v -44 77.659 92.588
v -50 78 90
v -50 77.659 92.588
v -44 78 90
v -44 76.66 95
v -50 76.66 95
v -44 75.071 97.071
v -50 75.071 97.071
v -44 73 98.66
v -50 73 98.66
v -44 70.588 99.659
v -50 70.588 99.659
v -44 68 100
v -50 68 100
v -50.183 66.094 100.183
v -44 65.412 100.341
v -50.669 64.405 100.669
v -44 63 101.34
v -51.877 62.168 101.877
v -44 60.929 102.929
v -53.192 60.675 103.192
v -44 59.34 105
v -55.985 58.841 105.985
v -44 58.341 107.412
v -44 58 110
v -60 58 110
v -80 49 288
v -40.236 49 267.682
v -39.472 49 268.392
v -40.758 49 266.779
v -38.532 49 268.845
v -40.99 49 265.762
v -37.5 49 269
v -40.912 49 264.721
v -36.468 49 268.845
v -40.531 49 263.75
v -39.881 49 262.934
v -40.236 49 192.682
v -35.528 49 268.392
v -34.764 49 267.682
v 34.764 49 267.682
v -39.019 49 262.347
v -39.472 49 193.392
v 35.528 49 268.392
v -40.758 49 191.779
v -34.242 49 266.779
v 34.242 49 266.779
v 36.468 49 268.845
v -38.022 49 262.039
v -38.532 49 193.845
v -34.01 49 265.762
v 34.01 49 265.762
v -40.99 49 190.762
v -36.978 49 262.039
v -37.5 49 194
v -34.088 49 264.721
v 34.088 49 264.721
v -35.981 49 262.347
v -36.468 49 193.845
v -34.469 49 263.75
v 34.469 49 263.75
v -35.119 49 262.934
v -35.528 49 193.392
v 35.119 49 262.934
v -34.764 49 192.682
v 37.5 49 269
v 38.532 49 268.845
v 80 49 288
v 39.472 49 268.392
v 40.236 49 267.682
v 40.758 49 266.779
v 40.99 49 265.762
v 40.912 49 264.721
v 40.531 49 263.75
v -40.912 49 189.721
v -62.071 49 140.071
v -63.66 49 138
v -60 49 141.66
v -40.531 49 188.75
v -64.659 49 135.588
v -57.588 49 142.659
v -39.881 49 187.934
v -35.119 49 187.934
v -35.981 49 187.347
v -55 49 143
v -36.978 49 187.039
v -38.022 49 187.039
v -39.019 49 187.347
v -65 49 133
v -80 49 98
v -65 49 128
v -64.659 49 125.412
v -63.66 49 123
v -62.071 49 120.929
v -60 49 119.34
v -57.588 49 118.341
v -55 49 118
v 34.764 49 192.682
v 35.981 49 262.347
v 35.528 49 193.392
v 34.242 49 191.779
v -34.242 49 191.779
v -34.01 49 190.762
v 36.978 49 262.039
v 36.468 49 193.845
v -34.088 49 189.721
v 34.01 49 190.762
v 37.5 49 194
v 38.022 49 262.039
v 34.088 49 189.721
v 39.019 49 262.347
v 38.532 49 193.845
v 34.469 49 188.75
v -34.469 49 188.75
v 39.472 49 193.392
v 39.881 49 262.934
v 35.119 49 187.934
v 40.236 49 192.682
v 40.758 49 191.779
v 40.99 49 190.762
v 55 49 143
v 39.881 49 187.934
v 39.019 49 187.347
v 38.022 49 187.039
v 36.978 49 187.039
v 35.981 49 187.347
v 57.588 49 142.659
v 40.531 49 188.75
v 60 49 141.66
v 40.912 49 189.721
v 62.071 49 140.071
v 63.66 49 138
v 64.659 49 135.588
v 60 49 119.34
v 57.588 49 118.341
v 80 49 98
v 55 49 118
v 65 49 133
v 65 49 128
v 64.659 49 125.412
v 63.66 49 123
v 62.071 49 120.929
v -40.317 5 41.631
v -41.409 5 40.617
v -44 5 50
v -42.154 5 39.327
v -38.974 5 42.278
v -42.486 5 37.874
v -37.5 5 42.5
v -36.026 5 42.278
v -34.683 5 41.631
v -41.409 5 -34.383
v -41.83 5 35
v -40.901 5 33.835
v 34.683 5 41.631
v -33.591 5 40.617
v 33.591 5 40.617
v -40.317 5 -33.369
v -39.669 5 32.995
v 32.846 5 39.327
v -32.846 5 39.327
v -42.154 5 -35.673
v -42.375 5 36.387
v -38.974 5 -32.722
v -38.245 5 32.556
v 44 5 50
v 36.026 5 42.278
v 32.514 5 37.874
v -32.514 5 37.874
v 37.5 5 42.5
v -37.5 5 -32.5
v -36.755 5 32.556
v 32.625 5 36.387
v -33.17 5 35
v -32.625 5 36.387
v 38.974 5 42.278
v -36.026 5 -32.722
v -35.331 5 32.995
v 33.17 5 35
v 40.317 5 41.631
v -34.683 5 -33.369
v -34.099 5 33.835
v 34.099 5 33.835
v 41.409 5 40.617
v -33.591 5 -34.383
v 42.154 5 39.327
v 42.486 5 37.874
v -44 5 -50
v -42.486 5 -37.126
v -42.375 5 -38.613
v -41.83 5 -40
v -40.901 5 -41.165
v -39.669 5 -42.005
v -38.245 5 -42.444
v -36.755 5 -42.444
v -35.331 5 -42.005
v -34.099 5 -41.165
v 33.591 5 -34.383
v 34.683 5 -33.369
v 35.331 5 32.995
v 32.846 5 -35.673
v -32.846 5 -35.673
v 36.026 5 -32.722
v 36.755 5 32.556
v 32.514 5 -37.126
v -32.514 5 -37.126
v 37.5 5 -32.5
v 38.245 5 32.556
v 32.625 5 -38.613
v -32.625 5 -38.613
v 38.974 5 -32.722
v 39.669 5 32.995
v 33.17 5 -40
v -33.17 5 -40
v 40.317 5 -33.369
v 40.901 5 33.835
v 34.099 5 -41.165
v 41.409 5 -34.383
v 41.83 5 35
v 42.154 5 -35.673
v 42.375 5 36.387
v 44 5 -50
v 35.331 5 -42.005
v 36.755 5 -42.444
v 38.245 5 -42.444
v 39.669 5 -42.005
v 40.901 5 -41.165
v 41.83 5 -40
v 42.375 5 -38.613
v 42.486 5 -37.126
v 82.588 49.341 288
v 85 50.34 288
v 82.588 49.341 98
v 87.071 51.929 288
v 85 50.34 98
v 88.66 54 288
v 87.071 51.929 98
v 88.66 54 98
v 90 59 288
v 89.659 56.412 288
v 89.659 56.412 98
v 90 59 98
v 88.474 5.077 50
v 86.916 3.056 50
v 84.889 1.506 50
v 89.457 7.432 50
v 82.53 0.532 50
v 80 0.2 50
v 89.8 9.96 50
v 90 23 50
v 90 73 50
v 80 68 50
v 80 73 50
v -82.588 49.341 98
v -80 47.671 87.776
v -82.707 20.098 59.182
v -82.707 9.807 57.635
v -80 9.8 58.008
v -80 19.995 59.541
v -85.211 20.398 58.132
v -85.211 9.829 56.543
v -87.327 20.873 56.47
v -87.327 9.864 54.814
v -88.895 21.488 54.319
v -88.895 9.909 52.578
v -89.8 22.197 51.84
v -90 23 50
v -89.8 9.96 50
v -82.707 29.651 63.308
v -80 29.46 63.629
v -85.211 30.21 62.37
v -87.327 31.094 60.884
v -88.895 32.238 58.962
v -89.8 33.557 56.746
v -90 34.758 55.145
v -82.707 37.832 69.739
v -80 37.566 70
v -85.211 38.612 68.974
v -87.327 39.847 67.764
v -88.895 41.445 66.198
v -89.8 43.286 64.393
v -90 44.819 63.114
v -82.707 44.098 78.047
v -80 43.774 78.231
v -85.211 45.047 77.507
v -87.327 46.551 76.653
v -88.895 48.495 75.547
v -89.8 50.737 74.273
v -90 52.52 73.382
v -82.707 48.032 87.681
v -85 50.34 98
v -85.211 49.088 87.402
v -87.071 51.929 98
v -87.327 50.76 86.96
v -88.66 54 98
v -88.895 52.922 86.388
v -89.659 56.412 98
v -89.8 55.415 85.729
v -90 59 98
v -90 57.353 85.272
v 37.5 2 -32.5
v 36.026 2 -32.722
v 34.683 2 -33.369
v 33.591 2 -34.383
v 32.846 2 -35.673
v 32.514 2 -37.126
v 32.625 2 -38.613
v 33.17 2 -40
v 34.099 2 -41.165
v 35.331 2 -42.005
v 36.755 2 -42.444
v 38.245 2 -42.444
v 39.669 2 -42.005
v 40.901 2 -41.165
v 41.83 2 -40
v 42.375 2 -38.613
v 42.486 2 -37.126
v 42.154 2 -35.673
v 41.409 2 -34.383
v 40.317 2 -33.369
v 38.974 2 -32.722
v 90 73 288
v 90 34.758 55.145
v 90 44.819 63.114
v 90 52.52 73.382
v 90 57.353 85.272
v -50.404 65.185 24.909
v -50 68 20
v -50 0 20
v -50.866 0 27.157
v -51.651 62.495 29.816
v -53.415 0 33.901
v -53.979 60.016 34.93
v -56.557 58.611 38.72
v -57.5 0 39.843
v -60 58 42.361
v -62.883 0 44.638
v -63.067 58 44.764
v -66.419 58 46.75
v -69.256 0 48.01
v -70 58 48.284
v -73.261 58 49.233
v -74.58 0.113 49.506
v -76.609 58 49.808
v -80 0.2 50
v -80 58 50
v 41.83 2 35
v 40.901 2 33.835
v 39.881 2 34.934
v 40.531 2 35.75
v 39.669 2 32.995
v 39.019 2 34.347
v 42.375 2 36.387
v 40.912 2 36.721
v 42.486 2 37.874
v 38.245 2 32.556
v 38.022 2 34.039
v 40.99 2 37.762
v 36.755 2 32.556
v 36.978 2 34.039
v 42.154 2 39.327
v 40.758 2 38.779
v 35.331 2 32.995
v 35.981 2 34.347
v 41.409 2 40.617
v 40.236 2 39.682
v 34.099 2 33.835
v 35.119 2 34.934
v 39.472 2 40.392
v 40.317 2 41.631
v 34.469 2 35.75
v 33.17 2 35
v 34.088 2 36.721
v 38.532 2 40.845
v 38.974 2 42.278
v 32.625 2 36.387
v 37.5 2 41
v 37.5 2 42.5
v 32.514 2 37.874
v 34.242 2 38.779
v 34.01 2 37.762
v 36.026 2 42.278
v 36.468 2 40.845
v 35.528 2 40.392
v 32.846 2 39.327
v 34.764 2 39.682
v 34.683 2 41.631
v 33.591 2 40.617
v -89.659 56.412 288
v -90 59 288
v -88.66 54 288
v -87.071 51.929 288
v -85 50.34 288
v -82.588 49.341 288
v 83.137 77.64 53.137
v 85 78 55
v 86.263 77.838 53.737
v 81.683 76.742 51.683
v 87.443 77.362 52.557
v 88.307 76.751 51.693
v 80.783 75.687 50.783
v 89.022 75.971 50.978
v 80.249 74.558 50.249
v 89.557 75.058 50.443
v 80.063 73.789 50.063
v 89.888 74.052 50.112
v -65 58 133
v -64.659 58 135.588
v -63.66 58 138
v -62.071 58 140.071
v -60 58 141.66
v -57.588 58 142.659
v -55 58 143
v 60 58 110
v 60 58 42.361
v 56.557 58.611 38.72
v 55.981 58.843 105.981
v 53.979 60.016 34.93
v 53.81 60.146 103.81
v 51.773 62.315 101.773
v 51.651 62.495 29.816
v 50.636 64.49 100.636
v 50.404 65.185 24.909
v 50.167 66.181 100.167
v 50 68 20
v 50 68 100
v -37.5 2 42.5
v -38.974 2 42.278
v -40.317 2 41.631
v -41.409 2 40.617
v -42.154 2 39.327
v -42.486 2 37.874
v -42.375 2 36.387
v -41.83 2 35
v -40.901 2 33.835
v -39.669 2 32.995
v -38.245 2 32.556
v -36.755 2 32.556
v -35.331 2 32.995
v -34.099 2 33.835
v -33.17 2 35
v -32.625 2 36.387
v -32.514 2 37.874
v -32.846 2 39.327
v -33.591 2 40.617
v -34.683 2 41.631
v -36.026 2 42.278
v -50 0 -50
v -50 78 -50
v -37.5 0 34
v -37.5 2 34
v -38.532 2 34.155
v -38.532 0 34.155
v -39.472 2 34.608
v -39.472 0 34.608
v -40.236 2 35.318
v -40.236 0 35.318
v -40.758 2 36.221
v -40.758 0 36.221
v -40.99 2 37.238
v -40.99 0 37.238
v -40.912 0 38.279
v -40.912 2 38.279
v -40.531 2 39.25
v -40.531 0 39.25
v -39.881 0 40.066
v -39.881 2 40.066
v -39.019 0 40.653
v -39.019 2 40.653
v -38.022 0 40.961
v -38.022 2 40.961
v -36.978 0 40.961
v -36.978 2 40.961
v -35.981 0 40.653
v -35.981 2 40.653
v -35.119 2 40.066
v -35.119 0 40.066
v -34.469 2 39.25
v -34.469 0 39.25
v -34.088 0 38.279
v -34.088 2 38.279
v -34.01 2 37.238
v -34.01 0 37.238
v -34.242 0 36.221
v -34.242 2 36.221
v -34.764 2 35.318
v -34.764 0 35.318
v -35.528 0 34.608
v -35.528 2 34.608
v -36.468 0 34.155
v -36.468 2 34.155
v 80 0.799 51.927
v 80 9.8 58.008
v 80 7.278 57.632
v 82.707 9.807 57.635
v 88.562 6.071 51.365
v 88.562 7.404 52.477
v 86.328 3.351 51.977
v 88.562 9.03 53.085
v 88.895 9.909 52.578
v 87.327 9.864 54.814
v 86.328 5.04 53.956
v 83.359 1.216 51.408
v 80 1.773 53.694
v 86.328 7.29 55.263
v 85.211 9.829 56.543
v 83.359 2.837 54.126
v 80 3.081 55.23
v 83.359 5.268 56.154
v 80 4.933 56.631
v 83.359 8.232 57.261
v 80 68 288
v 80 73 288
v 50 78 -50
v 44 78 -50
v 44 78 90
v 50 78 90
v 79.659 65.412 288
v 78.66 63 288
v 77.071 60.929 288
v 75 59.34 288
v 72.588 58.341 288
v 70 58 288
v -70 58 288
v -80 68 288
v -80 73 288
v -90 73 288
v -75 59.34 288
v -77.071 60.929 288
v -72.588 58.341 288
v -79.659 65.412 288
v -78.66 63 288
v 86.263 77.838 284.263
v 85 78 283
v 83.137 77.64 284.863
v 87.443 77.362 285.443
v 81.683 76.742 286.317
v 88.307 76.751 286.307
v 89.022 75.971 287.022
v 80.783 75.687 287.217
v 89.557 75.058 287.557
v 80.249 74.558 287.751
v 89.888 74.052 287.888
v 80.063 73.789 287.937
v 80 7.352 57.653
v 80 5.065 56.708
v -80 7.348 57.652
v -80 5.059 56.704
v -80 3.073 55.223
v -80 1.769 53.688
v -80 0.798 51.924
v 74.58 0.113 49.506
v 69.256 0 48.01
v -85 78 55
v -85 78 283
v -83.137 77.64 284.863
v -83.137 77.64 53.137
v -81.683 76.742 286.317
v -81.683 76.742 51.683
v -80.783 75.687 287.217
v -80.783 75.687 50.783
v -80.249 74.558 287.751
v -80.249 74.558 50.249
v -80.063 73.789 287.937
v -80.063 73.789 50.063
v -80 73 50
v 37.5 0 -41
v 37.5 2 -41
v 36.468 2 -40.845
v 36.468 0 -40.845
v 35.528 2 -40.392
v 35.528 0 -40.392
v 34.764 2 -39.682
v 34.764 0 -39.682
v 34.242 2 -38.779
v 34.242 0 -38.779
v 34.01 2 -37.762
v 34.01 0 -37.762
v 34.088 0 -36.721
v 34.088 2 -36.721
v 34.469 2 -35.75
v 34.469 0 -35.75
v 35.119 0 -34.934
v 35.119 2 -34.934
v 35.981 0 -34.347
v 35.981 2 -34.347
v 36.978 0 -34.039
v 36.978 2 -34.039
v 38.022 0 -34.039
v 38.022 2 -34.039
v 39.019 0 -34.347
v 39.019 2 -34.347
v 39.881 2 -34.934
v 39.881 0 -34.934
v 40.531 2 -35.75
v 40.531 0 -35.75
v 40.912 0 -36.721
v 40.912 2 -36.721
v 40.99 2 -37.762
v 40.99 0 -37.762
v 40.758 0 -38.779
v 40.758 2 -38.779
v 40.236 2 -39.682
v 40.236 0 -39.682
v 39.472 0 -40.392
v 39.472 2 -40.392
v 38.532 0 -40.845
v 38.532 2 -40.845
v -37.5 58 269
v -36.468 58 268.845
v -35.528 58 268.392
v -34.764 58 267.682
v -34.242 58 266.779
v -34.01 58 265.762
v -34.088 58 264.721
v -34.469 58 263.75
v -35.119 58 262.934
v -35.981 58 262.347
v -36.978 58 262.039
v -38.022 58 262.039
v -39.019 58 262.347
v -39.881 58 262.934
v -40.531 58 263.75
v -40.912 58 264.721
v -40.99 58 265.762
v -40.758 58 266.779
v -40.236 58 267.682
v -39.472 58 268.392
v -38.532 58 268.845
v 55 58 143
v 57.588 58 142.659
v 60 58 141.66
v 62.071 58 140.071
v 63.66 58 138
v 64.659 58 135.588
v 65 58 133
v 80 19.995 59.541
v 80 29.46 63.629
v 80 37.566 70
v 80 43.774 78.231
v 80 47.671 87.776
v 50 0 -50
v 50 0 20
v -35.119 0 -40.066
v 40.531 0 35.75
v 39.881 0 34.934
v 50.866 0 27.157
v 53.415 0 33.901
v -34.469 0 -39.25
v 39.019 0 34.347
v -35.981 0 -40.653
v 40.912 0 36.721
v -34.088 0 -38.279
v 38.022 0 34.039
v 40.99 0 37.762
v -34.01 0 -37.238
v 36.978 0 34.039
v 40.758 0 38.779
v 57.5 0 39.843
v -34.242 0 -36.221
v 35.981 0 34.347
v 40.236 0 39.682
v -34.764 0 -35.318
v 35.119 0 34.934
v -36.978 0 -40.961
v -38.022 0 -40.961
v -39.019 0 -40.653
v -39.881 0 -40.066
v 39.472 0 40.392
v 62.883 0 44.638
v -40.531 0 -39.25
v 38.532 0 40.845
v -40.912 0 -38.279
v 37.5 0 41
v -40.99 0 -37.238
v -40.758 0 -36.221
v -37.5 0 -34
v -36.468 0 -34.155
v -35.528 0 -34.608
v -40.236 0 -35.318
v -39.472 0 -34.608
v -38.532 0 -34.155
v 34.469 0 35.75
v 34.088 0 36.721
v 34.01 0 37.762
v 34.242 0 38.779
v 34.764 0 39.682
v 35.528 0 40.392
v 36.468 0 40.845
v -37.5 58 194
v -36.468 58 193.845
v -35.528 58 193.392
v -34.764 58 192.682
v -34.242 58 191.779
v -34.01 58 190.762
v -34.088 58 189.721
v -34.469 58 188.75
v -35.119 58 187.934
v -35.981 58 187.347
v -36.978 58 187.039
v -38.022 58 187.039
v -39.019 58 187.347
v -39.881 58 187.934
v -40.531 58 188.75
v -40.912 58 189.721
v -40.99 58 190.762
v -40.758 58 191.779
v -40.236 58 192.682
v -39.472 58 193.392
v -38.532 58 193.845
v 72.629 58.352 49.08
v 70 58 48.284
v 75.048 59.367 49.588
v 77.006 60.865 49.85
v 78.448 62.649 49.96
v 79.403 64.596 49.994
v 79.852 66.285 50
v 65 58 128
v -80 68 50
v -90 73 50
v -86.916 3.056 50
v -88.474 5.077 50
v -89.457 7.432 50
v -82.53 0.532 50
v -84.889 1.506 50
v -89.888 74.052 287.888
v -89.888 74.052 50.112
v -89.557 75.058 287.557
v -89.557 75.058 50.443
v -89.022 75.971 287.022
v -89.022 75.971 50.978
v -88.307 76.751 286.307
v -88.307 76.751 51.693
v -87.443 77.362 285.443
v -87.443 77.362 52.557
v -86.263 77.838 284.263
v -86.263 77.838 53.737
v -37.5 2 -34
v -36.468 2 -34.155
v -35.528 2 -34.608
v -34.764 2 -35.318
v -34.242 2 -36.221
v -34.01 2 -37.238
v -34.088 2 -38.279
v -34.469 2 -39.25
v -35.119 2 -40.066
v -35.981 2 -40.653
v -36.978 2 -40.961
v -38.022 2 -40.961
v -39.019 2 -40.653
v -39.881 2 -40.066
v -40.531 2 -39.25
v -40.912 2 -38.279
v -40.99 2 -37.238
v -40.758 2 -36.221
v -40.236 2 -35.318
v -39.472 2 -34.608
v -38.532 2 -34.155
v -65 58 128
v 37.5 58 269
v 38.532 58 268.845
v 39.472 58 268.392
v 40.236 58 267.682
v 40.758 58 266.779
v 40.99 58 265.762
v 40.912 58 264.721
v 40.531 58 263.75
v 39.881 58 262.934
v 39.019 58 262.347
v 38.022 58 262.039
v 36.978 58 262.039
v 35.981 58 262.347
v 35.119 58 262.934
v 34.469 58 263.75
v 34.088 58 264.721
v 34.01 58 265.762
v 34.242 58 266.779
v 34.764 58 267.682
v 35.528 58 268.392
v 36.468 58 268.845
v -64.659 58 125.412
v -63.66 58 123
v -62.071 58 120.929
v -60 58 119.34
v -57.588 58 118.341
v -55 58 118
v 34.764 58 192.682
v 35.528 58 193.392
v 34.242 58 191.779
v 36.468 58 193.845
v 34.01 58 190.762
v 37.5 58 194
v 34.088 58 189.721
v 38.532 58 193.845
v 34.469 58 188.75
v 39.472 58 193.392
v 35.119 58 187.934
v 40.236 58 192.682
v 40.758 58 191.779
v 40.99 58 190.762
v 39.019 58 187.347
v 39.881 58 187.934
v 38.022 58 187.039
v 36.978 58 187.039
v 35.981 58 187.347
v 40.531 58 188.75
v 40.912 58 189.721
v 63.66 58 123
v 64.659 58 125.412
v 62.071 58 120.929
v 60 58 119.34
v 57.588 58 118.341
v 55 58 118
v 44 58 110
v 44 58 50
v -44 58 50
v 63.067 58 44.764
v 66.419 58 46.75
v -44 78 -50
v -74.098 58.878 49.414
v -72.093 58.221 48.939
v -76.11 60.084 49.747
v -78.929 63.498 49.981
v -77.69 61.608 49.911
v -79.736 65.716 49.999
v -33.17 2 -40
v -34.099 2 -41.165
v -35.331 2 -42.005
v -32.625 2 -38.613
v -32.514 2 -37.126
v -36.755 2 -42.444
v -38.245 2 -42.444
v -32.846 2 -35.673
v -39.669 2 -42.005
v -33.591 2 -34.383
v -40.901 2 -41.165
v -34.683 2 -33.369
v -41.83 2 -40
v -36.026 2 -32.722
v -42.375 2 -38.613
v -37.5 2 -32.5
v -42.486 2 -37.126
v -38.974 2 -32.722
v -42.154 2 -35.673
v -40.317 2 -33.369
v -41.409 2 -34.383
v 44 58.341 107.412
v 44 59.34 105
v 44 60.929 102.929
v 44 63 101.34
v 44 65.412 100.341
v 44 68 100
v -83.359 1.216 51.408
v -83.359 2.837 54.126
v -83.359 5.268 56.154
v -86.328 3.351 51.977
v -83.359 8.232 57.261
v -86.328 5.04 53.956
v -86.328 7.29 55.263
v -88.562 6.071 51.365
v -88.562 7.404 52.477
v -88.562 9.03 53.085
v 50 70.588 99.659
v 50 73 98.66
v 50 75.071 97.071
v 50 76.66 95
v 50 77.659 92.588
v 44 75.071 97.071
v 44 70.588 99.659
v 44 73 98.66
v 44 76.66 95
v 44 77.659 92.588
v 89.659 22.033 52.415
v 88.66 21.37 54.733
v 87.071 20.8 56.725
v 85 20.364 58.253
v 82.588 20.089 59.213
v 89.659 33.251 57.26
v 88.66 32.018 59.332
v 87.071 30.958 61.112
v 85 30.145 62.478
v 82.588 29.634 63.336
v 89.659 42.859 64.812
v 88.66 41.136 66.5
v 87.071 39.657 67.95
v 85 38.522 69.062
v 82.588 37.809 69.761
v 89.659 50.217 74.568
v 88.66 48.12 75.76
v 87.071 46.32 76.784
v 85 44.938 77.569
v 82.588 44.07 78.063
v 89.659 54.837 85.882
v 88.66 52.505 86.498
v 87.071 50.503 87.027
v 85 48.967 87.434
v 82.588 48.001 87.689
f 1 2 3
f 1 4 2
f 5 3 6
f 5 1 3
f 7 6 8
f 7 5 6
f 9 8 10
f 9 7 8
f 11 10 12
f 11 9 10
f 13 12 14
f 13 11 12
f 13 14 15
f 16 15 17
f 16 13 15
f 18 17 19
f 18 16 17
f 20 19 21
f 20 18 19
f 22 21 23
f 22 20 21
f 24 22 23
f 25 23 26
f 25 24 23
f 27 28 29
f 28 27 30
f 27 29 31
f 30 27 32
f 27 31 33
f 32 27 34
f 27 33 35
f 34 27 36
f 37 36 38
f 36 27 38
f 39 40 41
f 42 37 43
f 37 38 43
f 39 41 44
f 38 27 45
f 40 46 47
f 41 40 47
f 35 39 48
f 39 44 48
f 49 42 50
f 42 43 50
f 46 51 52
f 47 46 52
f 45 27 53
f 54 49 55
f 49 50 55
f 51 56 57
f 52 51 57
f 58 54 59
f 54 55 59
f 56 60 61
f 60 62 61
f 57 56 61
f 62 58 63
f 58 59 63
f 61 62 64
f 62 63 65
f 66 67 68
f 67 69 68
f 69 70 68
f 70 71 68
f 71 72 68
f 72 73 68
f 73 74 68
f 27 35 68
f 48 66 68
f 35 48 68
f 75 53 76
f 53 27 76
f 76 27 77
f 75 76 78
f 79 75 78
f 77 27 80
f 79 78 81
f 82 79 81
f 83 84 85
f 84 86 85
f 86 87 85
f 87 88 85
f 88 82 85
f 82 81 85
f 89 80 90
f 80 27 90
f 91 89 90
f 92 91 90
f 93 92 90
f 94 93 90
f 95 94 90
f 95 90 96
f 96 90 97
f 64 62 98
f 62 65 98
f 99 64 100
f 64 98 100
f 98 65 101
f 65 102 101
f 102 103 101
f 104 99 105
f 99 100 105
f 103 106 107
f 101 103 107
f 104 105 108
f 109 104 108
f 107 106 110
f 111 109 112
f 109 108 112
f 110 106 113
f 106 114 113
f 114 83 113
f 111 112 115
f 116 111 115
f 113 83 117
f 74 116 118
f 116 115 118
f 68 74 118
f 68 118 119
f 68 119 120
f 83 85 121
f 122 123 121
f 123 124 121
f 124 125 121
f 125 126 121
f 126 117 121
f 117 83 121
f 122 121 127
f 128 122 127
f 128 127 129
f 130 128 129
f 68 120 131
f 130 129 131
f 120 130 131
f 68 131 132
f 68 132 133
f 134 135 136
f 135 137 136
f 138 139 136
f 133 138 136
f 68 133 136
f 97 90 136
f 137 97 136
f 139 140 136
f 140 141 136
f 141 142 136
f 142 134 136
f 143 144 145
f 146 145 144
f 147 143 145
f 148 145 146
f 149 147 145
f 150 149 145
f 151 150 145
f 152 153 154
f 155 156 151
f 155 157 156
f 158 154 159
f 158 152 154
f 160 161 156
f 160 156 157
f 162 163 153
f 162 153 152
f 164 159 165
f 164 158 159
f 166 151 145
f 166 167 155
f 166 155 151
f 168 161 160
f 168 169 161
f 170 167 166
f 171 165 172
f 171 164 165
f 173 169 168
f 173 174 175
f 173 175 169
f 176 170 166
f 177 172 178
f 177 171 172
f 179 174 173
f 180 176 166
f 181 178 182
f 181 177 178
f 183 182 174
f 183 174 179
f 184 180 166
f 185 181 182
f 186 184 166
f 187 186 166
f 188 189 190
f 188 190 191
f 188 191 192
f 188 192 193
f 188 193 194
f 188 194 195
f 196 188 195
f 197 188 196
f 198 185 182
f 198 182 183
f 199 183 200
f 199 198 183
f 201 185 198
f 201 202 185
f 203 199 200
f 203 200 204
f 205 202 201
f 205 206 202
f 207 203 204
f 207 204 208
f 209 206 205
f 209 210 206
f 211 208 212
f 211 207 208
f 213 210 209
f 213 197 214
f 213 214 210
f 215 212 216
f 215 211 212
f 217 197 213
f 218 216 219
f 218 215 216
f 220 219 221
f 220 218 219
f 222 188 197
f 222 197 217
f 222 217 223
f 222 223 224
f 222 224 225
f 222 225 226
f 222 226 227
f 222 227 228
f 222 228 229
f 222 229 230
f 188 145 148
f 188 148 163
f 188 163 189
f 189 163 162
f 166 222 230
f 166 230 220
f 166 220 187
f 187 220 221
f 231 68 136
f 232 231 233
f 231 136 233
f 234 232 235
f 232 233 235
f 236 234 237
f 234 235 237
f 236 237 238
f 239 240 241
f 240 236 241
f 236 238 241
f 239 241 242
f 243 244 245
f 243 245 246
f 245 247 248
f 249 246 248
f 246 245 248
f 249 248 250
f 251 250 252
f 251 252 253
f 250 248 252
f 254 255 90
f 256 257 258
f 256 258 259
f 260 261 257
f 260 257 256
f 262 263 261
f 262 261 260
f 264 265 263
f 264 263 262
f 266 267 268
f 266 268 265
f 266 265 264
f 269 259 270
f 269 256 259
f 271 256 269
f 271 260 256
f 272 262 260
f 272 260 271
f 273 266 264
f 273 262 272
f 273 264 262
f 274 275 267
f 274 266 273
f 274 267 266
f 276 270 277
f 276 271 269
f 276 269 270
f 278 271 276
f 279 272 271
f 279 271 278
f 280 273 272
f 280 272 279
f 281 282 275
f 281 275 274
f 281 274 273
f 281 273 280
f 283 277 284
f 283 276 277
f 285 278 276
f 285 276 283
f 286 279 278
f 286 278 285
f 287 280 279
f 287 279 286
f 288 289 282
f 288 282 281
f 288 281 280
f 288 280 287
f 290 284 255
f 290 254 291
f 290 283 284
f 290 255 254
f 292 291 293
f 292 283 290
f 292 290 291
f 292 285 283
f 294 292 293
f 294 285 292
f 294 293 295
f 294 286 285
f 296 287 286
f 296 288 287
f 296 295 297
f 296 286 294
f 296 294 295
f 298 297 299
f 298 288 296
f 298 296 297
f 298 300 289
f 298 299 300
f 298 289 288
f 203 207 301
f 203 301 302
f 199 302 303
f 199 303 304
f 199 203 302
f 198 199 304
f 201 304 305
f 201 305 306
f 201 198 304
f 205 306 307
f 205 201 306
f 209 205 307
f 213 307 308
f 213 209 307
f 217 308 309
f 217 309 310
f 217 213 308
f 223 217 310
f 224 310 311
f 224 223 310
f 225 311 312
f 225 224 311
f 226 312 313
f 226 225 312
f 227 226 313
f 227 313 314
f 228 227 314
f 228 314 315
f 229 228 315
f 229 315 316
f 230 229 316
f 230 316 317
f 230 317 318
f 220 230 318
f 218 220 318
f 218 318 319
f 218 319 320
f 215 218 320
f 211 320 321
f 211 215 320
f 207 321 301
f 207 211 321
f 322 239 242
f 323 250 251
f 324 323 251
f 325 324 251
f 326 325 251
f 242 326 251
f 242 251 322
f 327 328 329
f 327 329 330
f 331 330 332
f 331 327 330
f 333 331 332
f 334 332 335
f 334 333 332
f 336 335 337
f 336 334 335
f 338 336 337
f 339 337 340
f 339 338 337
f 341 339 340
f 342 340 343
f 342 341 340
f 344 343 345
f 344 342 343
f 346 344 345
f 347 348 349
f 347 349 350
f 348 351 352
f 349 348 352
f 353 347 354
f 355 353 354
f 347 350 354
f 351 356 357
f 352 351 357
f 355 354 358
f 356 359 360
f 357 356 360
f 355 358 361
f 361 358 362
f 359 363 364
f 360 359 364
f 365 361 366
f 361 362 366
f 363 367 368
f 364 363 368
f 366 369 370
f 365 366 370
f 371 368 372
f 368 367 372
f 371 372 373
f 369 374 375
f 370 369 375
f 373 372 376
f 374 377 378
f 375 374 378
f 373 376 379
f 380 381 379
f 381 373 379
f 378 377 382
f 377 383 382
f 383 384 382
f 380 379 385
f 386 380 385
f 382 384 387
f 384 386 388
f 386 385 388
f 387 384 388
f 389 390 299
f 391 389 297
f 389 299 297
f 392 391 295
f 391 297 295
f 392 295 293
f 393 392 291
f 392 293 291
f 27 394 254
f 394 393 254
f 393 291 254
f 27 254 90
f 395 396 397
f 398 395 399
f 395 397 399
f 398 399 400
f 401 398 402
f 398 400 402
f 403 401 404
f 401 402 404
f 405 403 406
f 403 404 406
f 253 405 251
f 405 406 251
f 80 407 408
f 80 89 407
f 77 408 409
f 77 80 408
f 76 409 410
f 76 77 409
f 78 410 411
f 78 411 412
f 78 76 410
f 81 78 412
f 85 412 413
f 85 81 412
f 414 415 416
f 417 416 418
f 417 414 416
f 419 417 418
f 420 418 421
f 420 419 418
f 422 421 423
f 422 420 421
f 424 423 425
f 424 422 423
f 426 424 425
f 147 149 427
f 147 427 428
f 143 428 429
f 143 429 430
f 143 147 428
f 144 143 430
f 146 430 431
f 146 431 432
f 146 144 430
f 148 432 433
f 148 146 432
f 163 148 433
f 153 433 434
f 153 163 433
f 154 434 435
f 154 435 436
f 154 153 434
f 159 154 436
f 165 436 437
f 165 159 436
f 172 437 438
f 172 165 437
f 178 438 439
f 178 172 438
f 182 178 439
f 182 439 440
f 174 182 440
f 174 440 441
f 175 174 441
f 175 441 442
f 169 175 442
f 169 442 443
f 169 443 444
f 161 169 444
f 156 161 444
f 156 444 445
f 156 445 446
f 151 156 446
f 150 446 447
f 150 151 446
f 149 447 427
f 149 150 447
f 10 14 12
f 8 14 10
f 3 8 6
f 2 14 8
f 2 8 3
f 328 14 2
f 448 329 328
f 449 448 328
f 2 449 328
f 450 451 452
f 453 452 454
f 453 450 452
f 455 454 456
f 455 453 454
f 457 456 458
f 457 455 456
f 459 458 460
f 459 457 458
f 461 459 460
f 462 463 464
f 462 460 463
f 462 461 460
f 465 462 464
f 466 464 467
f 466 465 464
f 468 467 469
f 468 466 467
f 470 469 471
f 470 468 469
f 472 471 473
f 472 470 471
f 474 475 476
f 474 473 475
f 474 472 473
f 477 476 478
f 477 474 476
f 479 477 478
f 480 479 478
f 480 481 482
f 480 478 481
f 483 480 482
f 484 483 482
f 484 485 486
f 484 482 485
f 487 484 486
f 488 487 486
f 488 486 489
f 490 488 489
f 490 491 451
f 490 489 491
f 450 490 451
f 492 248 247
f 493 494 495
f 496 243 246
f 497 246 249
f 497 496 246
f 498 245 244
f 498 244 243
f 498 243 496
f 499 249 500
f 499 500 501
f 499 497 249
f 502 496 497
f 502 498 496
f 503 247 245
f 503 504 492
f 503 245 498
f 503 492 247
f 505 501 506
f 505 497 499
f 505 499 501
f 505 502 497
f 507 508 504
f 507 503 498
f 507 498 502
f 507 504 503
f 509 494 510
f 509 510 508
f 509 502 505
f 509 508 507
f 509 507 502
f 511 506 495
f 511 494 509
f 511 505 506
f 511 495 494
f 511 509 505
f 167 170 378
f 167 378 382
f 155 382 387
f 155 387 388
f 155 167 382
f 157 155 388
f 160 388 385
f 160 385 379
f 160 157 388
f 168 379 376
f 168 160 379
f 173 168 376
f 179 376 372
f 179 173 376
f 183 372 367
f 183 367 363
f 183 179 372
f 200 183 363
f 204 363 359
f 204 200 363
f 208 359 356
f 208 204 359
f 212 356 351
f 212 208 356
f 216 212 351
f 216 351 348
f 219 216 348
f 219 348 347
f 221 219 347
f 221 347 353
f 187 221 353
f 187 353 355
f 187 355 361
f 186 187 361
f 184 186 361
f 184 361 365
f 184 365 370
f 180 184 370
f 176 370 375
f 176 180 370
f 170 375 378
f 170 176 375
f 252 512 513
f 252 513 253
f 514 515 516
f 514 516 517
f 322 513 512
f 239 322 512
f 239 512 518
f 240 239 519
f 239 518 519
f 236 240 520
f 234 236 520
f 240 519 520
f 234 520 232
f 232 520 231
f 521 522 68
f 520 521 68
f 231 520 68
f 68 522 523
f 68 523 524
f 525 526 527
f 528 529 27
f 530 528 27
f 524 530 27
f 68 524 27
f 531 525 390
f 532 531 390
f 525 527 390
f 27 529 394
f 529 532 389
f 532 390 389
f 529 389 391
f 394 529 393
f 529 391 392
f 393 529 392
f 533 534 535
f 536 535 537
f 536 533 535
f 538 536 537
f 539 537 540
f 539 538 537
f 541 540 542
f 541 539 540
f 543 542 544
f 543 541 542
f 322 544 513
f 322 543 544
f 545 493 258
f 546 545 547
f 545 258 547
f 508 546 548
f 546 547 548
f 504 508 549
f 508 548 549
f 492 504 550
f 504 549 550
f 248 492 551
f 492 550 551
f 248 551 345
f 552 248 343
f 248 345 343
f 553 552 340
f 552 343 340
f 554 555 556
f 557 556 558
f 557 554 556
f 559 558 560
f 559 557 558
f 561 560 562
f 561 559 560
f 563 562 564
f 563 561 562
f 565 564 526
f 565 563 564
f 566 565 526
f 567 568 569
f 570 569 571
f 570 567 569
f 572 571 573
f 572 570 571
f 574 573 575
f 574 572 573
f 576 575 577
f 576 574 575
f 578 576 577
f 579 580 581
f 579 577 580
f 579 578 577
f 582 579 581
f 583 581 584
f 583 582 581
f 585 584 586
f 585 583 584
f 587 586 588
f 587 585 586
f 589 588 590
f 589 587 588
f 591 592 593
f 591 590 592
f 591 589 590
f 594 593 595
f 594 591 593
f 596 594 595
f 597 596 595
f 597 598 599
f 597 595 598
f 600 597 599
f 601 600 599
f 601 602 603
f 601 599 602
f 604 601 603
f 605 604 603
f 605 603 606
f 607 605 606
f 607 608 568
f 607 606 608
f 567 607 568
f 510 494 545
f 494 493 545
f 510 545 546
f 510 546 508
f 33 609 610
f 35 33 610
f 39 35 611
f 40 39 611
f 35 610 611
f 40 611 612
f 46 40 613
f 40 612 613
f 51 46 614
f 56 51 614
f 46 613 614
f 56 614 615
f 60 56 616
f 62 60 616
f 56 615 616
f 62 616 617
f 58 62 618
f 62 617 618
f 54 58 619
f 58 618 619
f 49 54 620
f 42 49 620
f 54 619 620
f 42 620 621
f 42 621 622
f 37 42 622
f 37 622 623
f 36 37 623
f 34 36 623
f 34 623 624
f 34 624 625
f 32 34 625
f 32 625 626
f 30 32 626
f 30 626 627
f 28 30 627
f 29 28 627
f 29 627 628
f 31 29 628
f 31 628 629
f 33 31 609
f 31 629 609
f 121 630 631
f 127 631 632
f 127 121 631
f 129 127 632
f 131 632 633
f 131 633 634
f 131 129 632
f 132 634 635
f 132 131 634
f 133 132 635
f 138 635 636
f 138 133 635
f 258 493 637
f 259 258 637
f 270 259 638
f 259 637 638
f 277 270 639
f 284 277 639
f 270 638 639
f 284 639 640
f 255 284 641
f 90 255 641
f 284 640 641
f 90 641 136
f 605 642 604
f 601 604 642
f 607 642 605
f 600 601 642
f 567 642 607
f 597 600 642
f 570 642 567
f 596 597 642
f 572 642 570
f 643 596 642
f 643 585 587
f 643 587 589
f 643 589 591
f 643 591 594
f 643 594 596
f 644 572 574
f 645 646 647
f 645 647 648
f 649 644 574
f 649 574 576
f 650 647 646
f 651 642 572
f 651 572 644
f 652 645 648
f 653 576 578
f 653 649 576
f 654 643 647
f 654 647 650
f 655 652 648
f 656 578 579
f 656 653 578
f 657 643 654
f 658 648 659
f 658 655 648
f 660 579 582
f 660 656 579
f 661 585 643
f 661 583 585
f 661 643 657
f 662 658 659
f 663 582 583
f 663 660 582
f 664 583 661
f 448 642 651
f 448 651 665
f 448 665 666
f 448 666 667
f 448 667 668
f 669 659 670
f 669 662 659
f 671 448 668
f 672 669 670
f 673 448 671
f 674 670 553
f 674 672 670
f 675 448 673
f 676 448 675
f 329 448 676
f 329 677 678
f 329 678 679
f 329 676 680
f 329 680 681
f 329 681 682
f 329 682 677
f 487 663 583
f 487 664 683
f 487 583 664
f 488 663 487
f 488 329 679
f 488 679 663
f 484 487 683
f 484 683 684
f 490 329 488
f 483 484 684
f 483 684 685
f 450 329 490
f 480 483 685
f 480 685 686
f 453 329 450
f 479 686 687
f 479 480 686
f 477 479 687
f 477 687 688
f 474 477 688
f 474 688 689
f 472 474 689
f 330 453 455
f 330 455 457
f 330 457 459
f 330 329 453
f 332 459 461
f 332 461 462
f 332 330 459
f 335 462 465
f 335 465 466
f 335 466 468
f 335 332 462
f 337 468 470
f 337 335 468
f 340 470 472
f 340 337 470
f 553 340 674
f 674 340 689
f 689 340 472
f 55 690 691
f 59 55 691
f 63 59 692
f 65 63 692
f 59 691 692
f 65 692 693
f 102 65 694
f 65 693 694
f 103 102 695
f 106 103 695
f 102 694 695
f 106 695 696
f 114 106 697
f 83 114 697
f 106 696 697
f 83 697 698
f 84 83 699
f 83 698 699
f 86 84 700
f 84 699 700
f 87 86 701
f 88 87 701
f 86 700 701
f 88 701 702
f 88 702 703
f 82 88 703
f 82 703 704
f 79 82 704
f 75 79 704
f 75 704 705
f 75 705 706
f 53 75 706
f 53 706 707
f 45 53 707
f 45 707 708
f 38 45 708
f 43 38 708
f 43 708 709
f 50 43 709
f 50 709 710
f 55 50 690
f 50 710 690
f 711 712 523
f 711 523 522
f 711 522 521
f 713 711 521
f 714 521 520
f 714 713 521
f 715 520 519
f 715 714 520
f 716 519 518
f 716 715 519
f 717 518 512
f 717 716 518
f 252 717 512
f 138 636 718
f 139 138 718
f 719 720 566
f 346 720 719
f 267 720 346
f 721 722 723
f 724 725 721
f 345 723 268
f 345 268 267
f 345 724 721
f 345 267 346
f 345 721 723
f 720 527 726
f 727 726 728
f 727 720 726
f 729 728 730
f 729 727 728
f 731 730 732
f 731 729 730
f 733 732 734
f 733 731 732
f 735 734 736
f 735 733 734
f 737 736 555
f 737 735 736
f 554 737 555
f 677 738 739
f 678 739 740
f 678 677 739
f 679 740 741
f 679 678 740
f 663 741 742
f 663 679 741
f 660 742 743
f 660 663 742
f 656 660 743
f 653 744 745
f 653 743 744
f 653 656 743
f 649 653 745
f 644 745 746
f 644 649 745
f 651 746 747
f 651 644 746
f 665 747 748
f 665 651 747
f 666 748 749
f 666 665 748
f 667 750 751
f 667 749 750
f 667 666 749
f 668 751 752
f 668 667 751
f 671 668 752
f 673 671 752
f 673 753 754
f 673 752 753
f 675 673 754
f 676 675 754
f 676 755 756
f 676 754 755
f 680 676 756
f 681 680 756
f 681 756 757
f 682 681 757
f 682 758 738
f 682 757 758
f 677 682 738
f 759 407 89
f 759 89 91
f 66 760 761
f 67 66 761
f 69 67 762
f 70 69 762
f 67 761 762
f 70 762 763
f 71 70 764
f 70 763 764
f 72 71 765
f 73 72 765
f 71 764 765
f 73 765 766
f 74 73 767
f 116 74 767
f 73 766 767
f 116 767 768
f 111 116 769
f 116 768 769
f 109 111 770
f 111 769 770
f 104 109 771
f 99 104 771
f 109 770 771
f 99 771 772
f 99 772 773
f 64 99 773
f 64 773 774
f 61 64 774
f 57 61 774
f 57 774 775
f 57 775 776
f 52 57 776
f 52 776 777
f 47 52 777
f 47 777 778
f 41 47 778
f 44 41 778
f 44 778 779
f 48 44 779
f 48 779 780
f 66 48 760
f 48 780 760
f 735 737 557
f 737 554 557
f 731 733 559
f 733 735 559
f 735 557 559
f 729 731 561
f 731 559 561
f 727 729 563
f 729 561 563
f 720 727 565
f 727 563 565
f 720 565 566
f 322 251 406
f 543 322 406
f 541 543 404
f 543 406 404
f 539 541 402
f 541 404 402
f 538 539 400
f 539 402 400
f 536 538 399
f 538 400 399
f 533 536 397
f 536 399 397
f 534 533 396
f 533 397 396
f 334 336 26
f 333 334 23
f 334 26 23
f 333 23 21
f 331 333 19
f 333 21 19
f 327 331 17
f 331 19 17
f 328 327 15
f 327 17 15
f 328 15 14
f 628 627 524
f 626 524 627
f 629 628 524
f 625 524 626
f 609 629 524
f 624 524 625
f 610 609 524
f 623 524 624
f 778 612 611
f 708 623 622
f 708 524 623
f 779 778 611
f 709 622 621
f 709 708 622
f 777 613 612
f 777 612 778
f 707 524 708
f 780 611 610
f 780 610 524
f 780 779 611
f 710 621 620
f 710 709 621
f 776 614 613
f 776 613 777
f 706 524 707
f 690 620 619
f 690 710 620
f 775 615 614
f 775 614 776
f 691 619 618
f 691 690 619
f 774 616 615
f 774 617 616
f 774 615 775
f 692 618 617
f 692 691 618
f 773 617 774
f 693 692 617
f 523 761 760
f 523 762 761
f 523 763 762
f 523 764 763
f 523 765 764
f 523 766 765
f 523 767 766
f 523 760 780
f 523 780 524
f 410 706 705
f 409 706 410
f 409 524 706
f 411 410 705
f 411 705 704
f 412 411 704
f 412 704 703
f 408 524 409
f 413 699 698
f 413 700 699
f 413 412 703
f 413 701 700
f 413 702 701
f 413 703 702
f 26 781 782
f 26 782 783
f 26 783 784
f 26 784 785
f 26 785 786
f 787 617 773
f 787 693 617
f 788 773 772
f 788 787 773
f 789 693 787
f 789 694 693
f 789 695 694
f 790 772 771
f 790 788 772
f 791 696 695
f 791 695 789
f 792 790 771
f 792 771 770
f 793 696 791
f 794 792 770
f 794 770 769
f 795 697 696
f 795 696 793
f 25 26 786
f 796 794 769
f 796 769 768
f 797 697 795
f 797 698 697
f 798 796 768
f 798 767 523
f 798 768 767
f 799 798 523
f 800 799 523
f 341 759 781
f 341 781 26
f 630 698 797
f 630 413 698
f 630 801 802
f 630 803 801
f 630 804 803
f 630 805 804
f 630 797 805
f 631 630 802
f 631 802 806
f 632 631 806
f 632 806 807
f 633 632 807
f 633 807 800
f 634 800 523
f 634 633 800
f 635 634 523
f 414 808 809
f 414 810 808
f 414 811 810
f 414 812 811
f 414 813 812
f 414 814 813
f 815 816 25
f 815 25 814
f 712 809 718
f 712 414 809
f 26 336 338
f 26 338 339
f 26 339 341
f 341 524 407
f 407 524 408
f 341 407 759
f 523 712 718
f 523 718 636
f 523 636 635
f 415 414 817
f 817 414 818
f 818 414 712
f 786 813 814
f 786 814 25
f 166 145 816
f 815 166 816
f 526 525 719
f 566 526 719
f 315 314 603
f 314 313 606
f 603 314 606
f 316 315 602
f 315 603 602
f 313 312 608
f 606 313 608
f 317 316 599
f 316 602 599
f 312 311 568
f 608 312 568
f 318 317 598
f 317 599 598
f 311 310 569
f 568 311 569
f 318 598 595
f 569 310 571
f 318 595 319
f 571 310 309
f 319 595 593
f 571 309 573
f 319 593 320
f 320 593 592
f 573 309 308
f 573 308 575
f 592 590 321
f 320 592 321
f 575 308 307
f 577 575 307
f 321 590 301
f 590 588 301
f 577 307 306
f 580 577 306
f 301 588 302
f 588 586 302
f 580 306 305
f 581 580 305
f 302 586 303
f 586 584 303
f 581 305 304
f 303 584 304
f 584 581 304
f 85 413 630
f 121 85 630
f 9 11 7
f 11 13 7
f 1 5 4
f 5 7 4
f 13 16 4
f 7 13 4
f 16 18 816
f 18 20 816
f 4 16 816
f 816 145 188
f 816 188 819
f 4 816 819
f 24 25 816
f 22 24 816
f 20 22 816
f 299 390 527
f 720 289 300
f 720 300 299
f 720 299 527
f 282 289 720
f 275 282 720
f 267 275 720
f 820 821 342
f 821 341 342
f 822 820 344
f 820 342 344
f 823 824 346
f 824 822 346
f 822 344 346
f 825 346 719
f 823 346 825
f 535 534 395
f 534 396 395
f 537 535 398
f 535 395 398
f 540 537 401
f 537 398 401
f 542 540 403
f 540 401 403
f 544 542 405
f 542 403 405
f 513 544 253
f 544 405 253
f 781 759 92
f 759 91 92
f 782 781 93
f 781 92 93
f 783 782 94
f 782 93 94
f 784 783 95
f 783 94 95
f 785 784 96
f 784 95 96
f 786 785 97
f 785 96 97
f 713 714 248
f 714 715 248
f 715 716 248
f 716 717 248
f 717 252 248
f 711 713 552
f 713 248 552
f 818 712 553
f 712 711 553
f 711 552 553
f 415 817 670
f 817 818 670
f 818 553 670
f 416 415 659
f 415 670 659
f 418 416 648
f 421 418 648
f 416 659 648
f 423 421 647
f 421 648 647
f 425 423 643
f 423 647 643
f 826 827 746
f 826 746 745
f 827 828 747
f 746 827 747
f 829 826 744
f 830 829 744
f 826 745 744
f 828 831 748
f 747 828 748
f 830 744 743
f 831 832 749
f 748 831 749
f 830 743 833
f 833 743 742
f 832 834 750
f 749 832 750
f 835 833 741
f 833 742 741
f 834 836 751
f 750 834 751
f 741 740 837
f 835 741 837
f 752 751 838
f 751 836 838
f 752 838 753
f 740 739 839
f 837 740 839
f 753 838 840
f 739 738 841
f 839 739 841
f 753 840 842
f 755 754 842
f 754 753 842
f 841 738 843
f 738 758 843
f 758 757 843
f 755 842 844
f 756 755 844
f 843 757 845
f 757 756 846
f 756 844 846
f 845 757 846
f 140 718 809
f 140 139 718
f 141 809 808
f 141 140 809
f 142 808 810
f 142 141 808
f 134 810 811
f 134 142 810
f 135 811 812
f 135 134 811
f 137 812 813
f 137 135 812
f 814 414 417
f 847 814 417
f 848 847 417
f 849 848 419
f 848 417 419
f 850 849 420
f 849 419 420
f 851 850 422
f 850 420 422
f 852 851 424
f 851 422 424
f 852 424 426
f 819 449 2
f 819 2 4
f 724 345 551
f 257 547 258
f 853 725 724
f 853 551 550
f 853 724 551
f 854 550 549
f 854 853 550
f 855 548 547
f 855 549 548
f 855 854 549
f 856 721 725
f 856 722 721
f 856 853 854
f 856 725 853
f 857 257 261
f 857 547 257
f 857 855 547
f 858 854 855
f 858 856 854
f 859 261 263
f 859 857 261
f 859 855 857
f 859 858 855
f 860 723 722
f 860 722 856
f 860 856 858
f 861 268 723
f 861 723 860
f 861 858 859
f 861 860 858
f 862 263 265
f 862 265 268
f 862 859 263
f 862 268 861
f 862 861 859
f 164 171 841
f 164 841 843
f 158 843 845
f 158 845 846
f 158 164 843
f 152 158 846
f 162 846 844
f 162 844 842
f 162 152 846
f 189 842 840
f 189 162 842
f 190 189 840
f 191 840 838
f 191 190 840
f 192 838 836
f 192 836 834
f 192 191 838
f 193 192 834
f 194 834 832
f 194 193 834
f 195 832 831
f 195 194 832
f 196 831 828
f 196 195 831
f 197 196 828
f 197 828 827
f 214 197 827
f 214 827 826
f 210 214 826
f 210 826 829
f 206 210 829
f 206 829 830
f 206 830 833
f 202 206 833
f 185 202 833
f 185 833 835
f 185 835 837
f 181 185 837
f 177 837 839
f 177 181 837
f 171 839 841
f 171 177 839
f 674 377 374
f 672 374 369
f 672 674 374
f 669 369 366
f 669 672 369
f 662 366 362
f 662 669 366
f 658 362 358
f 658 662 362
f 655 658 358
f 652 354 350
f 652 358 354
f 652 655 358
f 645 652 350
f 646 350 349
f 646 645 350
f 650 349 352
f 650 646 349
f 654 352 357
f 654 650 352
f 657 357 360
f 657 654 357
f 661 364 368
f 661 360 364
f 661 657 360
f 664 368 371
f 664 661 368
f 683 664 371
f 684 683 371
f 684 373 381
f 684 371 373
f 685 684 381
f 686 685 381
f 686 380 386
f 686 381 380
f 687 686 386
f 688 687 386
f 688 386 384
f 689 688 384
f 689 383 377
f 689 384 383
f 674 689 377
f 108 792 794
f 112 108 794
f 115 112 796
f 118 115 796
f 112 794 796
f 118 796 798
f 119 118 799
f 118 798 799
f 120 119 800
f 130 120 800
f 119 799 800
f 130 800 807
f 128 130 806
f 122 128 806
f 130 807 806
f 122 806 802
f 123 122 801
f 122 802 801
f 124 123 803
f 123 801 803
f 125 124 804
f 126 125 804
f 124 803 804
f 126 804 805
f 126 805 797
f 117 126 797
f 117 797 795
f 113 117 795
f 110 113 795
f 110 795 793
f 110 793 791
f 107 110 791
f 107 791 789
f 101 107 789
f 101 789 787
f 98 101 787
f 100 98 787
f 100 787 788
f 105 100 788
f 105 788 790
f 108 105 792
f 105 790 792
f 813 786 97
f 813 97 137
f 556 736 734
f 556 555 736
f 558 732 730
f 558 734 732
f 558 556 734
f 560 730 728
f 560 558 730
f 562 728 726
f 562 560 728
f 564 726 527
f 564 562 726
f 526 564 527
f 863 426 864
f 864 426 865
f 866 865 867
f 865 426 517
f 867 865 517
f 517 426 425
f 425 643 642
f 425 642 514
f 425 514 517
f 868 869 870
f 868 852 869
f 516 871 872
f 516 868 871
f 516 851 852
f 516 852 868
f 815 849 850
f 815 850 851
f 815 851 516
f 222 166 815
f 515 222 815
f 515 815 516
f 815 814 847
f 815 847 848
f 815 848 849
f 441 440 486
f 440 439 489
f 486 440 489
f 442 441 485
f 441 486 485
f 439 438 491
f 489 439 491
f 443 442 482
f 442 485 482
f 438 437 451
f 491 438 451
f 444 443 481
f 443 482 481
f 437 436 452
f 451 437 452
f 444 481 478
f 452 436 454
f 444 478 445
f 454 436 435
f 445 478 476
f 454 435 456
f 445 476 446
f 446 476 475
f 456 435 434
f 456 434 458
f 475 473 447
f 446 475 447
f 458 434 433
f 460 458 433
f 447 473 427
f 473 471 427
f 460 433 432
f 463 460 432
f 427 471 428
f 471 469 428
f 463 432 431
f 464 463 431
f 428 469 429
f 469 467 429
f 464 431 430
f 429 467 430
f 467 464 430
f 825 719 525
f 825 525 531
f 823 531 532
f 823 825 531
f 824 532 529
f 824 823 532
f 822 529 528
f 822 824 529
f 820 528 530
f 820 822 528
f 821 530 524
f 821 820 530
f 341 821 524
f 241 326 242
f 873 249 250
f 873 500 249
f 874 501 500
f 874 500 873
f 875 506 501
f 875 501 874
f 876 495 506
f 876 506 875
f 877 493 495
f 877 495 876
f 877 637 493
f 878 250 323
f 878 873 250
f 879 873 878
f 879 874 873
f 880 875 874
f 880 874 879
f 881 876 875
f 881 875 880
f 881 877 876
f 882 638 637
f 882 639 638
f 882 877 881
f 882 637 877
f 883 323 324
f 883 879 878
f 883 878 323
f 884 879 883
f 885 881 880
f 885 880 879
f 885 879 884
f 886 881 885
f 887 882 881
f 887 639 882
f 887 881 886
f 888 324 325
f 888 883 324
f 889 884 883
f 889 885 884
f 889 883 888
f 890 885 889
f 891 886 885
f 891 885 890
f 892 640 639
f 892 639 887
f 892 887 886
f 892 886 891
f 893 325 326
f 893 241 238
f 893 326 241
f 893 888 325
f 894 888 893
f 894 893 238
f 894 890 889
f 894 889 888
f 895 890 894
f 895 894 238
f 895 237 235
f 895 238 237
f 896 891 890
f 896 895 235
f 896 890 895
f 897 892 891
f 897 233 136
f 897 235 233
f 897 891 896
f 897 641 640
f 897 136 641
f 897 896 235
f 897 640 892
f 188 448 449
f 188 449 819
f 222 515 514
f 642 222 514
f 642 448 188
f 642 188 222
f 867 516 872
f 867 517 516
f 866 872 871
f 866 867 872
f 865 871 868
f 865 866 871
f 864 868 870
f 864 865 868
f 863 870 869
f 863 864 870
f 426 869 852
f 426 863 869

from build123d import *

# Parameters (mm, degrees)
SKETCH1_W           = 100
SKETCH1_H           = 100
SKETCH1_R           = 3.5
BOSS_EXTRUDE1_DEPTH = 5
CUT_EXTRUDE1_START  = -5
SKETCH6_R           = 5
CUT_EXTRUDE1_DEPTH  = 3
BOSS_EXTRUDE2_START = 40
SKETCH8_W           = 8
SKETCH8_H           = 58
BOSS_EXTRUDE2_DEPTH = 180
SKETCH9_W           = 180
SKETCH9_H           = 9
BOSS_EXTRUDE3_DEPTH = 230
SKETCH13_R          = 3.5
CUT_EXTRUDE3_DEPTH  = 9
SKETCH15_W          = 6
SKETCH15_H          = 100
BOSS_EXTRUDE6_DEPTH = 73
CUT_EXTRUDE4_REACH  = 309.259
SKETCH16_W          = 130
SKETCH16_H          = 25
FILLET1_R           = 40
FILLET2_R           = 10
SKETCH17_W          = 6
SKETCH17_H          = 20
BOSS_EXTRUDE7_DEPTH = 50
FILLET3_R           = 10
FILLET4_R           = 10
FILLET6_R           = 30
FILLET7_R           = 10
SKETCH18_W          = 10
SKETCH18_H          = 238
BOSS_EXTRUDE8_DEPTH = 20
FILLET8_R           = 10
FILLET9_R           = 10
FILLET10_R          = 5


# Some blends are built 0.0001 mm under size
with BuildPart() as part:
    # Sketch1 → Boss-Extrude1 (new body)
    with BuildSketch(Plane(origin=(0, 0, 0), x_dir=(1, 0, 0), z_dir=(0, 1, 0))):
        Rectangle(SKETCH1_W, SKETCH1_H)
        with Locations(Location((-37.5, 37.5, 0), (0, 0, 270))):
            Circle(SKETCH1_R, mode=Mode.SUBTRACT)
        with Locations(Location((37.5, 37.5, 0), (0, 0, 90))):
            Circle(SKETCH1_R, mode=Mode.SUBTRACT)
        with Locations(Location((37.5, -37.5, 0), (0, 0, 270))):
            Circle(SKETCH1_R, mode=Mode.SUBTRACT)
        with Locations(Location((-37.5, -37.5, 0), (0, 0, 90))):
            Circle(SKETCH1_R, mode=Mode.SUBTRACT)
    extrude(amount=BOSS_EXTRUDE1_DEPTH)

    # Sketch6 → Cut-Extrude1 (cut)
    with BuildSketch(Plane.XZ.offset(CUT_EXTRUDE1_START)):
        with Locations(Location((-37.5, 37.5, 0), (0, 0, 90))):
            Circle(SKETCH6_R)
        with Locations(Location((37.5, 37.5, 0), (0, 0, 90))):
            Circle(SKETCH6_R)
        with Locations(Location((37.5, -37.5, 0), (0, 0, 90))):
            Circle(SKETCH6_R)
        with Locations(Location((-37.5, -37.5, 0), (0, 0, 90))):
            Circle(SKETCH6_R)
    extrude(amount=CUT_EXTRUDE1_DEPTH, mode=Mode.SUBTRACT)

    # Sketch8 → Boss-Extrude2 (add)
    with BuildSketch(Plane.ZY.offset(50).offset(BOSS_EXTRUDE2_START)):
        with Locations((54, 29)):
            Rectangle(SKETCH8_W, SKETCH8_H)
    extrude(amount=-BOSS_EXTRUDE2_DEPTH)

    # Sketch9 → Boss-Extrude3 (add)
    with BuildSketch(Plane.XY.offset(58)):
        with Locations((0, 53.5)):
            Rectangle(SKETCH9_W, SKETCH9_H)
    extrude(amount=BOSS_EXTRUDE3_DEPTH)

    # Sketch13 → Cut-Extrude3 (cut)
    with BuildSketch(Plane(origin=(0, 58, 0), x_dir=(1, 0, 0), z_dir=(0, 1, 0))):
        with Locations(Location((-37.5, -190.5, 0), (0, 0, 270))):
            Circle(SKETCH13_R)
        with Locations(Location((37.5, -190.5, 0), (0, 0, 270))):
            Circle(SKETCH13_R)
        with Locations(Location((37.5, -265.5, 0), (0, 0, 270))):
            Circle(SKETCH13_R)
        with Locations(Location((-37.5, -265.5, 0), (0, 0, 270))):
            Circle(SKETCH13_R)
    extrude(amount=-CUT_EXTRUDE3_DEPTH, mode=Mode.SUBTRACT)

    # Sketch15 → Boss-Extrude6 (add)
    with BuildSketch(Plane(origin=(0, 5, 0), x_dir=(1, 0, 0), z_dir=(0, 1, 0))):
        with Locations((-47, 0)):
            Rectangle(SKETCH15_W, SKETCH15_H)
        with Locations((47, 0)):
            Rectangle(SKETCH15_W, SKETCH15_H)
    extrude(amount=BOSS_EXTRUDE6_DEPTH)

    # Sketch16 → Cut-Extrude4 (cut, up to next)
    with BuildSketch(Plane(origin=(0, 58, 0), x_dir=(1, 0, 0), z_dir=(0, 1, 0)), mode=Mode.PRIVATE) as cut_extrude4_sk1:
        with Locations((0, -130.5)):
            Rectangle(SKETCH16_W, SKETCH16_H)
    cut_extrude4_tool1 = extrude(cut_extrude4_sk1.sketch, amount=-CUT_EXTRUDE4_REACH, mode=Mode.PRIVATE) & part.part
    add(cut_extrude4_tool1.solids().sort_by_distance((0, 58, 130.5))[0], mode=Mode.SUBTRACT)

    # Fillet1
    fillet1_edges = [part.edges().sort_by_distance(p)[0] for p in [
        (0, 49, 58),
    ]]
    fillet(fillet1_edges, radius=FILLET1_R)

    # Fillet2
    fillet2_edges = [part.edges().sort_by_distance(p)[0] for p in [
        (65, 53.5, 118),
        (65, 53.5, 143),
        (-65, 53.5, 143),
        (-65, 53.5, 118),
    ]]
    fillet(fillet2_edges, radius=FILLET2_R)

    # Sketch17 → Boss-Extrude7 (add)
    with BuildSketch(Plane.XY.offset(50)):
        with Locations((-47, 68)):
            Rectangle(SKETCH17_W, SKETCH17_H)
        with Locations((47, 68)):
            Rectangle(SKETCH17_W, SKETCH17_H)
    extrude(amount=BOSS_EXTRUDE7_DEPTH)

    # Fillet3
    fillet3_edges = [part.edges().sort_by_distance(p)[0] for p in [
        (47, 78, 100),
        (-47, 78, 100),
    ]]
    fillet(fillet3_edges, radius=FILLET3_R)

    # Fillet4
    fillet4_edges = [part.edges().sort_by_distance(p)[0] for p in [
        (47, 58, 100),
        (-47, 58, 100),
    ]]
    fillet(fillet4_edges, radius=FILLET4_R - 0.0001)  # a hair under: the kernel refuses the full size

    # Fillet6
    fillet6_edges = [part.edges().sort_by_distance(p)[0] for p in [
        (50, 29, 50),
        (-50, 29, 50),
    ]]
    fillet(fillet6_edges, radius=FILLET6_R)

    # Fillet7
    # the kernel refuses this fillet: 10 mm, written as the material it takes off along each edge
    with BuildSketch(Plane(origin=(-114.974997499, 0, 58), x_dir=(0, 0.9999996667390088, 0.0008164079075175184), z_dir=(1, 0, 0))) as fillet7_piece_1:
        with BuildLine():
            CenterArc((9.991840753, -9.99815975), FILLET7_R, 91.099215266, 88.854008002)
            Line((-0.008155914, -9.989995671), (-1.008155581, -9.989179263))
            Line((-1.008155581, -9.989179263), (-0.999999667, 0.000816408))
            Line((-0.999999667, 0.000816408), (0.000816408, 0.999999667))
            ThreePointArc((0.000816408, 0.999999667), (9.000813409, 0.992651996), (9.780819517, 0.999815975))
            Line((9.780819517, 0.999815975), (9.800003266, 0))
        make_face()
    extrude(amount=229.949994999, mode=Mode.SUBTRACT)

    # Sketch18 → Boss-Extrude8 (add)
    with BuildSketch(Plane(origin=(0, 58, 0), x_dir=(1, 0, 0), z_dir=(0, 1, 0))):
        with Locations((-85, -169)):
            Rectangle(SKETCH18_W, SKETCH18_H)
        with Locations((85, -169)):
            Rectangle(SKETCH18_W, SKETCH18_H)
    extrude(amount=BOSS_EXTRUDE8_DEPTH)

    # Fillet8
    # the kernel refuses this fillet: 10 mm, written as the material it adds along each edge
    with BuildSketch(Plane(origin=(80, 58, 25), x_dir=(0, 1, 0), z_dir=(0, 0, 1))) as fillet8_piece_1_section:
        with BuildLine():
            CenterArc((FILLET8_R, FILLET8_R), FILLET8_R, 180, 90)
            Line((0, FILLET8_R), (0, 0))
            Line((0, 0), (FILLET8_R, 0))
        make_face()
    fillet8_piece_1 = extrude(amount=263, mode=Mode.PRIVATE)
    fillet8_piece_1 = fillet8_piece_1 - Plane(origin=(80, 58.60546515, 20), x_dir=(-1, 0, 0), z_dir=(0, -1, 0)) * Cylinder(30, 567, mode=Mode.PRIVATE)
    add(fillet8_piece_1)
    with BuildSketch(Plane(origin=(-80, 58, 25), x_dir=(0, 1, 0), z_dir=(0, 0, 1))) as fillet8_piece_2_section:
        with BuildLine():
            CenterArc((FILLET8_R, -FILLET8_R), FILLET8_R, 90, 90)
            Line((0, -FILLET8_R), (0, 0))
            Line((0, 0), (FILLET8_R, 0))
        make_face()
    fillet8_piece_2 = extrude(amount=263, mode=Mode.PRIVATE)
    fillet8_piece_2 = fillet8_piece_2 - Plane(origin=(-80, 58.605465201, 20), x_dir=(0, 0, 1), z_dir=(0, -1, 0)) * Cylinder(30, 567, mode=Mode.PRIVATE)
    add(fillet8_piece_2)
    # the kernel refuses this fillet: 10 mm, written as the material it takes off along each edge
    with BuildSketch(Plane(origin=(90, 49, 98), x_dir=(-1, 0, 0), z_dir=(0, 0, 1))) as fillet8_2_piece_1:
        with BuildLine():
            CenterArc((FILLET8_R, -FILLET8_R), FILLET8_R, 90, 90)
            Line((0, -FILLET8_R), (0, 0))
            Line((0, 0), (FILLET8_R, 0))
        make_face()
    extrude(amount=215, mode=Mode.SUBTRACT)
    with BuildSketch(Plane(origin=(90, 10, 48.010001), x_dir=(0, 0.6665779251845226, -0.7454353557866013), z_dir=(0, 0.7454353557866013, 0.6665779251845226))) as fillet8_2_piece_2:
        with BuildLine():
            CenterArc((10 - FILLET8_R, FILLET8_R), FILLET8_R, 270, 90)
            Line((10 - FILLET8_R, 0), (10, 0))
            Line((10, 0), (10, FILLET8_R))
        make_face()
    revolve(axis=Axis((90, 10, 48.010001), (-1, 0, 0)), revolution_arc=220.657501671, mode=Mode.SUBTRACT)
    with BuildSketch(Plane(origin=(-90, 10, 48.010001), x_dir=(0, 0.6665779251845226, -0.7454353557866013), z_dir=(0, 0.7454353557866013, 0.6665779251845226))) as fillet8_2_piece_3:
        with BuildLine():
            CenterArc((10 - FILLET8_R, -FILLET8_R), FILLET8_R, 0, 90)
            Line((10 - FILLET8_R, 0), (10, 0))
            Line((10, 0), (10, -FILLET8_R))
        make_face()
    revolve(axis=Axis((-90, 10, 48.010001), (-1, 0, 0)), revolution_arc=220.657501671, mode=Mode.SUBTRACT)
    with BuildSketch(Plane(origin=(-90, 49, 98), x_dir=(1, 0, 0), z_dir=(0, 0, 1))) as fillet8_2_piece_4:
        with BuildLine():
            CenterArc((FILLET8_R, FILLET8_R), FILLET8_R, 180, 90)
            Line((0, FILLET8_R), (0, 0))
            Line((0, 0), (FILLET8_R, 0))
        make_face()
    extrude(amount=215, mode=Mode.SUBTRACT)
    with BuildSketch(Plane(origin=(90, 9, 98), x_dir=(0, 0.019999999999999886, -0.999799979995999), z_dir=(0, -0.999799979995999, -0.019999999999999886))) as fillet8_2_piece_5:
        with BuildLine():
            CenterArc((40 + FILLET8_R, -FILLET8_R), FILLET8_R, 90, 90)
            Line((40 + FILLET8_R, 0), (40, 0))
            Line((40, 0), (40, -FILLET8_R))
        make_face()
    revolve(axis=Axis((90, 9, 98), (1, 0, 0)), revolution_arc=88.854008002, mode=Mode.SUBTRACT)
    with BuildSketch(Plane(origin=(-90, 9, 98), x_dir=(0, 0.019999999999999886, -0.999799979995999), z_dir=(0, -0.999799979995999, -0.019999999999999886))) as fillet8_2_piece_6:
        with BuildLine():
            CenterArc((40 + FILLET8_R, FILLET8_R), FILLET8_R, 180, 90)
            Line((40 + FILLET8_R, 0), (40, 0))
            Line((40, 0), (40, FILLET8_R))
        make_face()
    revolve(axis=Axis((-90, 9, 98), (1, 0, 0)), revolution_arc=88.854008002, mode=Mode.SUBTRACT)

    # Fillet9
    fillet9_edges = [part.edges().sort_by_distance(p)[0] for p in [
        (50, 58, 64.99995),
        (-50, 58, 64.99995),
    ]]
    fillet(fillet9_edges, radius=FILLET9_R)

    # Fillet10
    fillet10_edges = [part.edges().sort_by_distance(p)[0] for p in [
        (-90, 78, 169),
        (-85, 78, 288),
        (-80, 78, 169),
        (-85, 78, 50),
        (90, 78, 169),
        (85, 78, 50),
        (80, 78, 169),
        (85, 78, 288),
    ]]
    fillet(fillet10_edges, radius=FILLET10_R - 0.0001)  # a hair under: the kernel refuses the full size


solid = part.part
